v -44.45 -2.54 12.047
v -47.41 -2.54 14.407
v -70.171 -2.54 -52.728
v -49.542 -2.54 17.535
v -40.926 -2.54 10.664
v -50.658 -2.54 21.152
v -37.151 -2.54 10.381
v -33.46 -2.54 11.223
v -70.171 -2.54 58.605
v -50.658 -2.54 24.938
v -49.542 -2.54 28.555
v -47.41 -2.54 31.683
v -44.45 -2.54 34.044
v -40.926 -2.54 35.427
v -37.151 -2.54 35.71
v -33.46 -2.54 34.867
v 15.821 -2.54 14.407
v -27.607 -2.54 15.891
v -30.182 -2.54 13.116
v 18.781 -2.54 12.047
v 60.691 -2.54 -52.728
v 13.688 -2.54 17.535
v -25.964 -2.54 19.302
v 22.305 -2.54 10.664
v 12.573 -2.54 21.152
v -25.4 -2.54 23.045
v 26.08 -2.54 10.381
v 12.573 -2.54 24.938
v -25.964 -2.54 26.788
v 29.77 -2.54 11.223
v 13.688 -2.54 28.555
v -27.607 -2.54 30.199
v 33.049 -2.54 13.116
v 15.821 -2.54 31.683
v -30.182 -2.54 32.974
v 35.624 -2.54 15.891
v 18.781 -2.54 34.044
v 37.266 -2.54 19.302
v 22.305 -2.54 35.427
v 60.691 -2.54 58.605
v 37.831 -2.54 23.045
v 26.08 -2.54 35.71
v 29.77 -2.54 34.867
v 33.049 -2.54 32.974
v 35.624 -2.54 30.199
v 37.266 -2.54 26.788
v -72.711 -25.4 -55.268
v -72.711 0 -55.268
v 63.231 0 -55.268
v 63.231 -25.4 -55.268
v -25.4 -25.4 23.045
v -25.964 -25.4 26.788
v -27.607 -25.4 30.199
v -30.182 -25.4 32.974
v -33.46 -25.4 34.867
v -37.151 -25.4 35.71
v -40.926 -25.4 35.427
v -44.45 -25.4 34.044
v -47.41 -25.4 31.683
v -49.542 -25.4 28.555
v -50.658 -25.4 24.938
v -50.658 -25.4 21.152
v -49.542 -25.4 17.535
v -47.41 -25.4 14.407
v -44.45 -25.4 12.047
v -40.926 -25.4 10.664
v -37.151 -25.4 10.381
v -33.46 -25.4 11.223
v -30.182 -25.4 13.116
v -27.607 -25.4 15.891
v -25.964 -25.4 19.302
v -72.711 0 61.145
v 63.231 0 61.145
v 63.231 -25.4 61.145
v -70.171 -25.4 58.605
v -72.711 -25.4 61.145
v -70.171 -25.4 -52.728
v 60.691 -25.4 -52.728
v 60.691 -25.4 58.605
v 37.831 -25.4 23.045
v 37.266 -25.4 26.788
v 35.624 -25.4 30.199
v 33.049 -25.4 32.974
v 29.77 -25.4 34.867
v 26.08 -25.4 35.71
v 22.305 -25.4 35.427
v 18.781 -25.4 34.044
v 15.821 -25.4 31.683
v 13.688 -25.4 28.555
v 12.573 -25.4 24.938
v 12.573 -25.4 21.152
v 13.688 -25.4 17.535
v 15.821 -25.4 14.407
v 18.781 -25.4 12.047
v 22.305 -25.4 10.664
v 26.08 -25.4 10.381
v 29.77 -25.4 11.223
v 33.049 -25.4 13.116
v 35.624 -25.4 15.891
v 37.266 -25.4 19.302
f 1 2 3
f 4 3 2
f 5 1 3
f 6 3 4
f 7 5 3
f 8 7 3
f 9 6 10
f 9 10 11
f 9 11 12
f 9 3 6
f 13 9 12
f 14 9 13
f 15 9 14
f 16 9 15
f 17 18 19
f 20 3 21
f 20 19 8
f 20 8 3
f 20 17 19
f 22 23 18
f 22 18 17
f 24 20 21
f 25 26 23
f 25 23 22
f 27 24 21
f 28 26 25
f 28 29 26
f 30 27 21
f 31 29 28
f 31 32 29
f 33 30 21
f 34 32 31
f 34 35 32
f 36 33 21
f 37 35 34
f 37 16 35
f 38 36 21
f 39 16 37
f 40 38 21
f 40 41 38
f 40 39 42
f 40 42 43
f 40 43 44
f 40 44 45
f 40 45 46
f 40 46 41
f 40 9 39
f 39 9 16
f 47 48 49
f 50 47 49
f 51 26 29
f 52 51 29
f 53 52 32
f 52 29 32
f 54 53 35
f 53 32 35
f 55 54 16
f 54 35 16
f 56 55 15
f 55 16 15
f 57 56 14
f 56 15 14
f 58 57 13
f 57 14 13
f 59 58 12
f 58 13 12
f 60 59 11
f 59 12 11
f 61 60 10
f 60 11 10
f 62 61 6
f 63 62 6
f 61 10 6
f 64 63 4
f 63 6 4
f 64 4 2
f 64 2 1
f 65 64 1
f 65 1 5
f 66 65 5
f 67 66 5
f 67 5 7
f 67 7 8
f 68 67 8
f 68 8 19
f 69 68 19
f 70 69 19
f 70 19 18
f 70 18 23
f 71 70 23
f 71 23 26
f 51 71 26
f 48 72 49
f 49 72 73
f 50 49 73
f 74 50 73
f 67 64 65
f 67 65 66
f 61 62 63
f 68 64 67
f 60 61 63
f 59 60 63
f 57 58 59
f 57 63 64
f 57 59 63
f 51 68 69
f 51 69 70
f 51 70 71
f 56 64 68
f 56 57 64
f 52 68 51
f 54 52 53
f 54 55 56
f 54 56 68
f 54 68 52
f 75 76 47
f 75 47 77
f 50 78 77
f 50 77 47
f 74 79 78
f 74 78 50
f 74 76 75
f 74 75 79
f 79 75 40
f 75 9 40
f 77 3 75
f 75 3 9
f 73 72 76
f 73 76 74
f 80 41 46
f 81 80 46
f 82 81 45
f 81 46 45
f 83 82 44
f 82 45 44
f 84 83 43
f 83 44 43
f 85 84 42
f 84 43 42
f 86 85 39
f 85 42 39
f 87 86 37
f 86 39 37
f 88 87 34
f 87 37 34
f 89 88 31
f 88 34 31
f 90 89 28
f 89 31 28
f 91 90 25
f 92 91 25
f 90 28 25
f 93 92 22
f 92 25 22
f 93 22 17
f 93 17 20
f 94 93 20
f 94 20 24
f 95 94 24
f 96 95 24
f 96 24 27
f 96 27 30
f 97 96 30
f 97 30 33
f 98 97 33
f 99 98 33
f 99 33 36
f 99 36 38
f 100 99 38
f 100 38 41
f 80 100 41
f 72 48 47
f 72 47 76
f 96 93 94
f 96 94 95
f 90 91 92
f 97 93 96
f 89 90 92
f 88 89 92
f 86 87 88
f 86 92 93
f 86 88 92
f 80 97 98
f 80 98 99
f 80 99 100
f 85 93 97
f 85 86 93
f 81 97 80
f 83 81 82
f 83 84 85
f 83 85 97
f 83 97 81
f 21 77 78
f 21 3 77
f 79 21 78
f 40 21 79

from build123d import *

# Parameters (mm, degrees)
F0_W     = 135.941163
F0_H     = 116.412658
F1_DEPTH = 25.4
F2_T     = -2.54
F3_R     = 12.7
F4_DEPTH = 25.4
F5_R     = 12.7
F6_DEPTH = 25.4


with BuildPart() as f1:
    # F0 (on Front) → F1 (new body)
    with BuildSketch(Plane.XZ):
        with Locations((-4.739925, 2.938757)):
            Rectangle(F0_W, F0_H)
    extrude(amount=F1_DEPTH)

    # F2
    f2_openings = [f1.faces().sort_by_distance(p)[0] for p in [
        (-4.739925, -25.4, 2.938757),
    ]]
    offset(amount=F2_T, openings=f2_openings)

    # F3 (on Front) → F4 (join)
    with BuildSketch(Plane.XZ):
        with Locations((-38.1, 23.045086)):
            Circle(F3_R)
    extrude(amount=F4_DEPTH)

    # F5 (on Front) → F6 (join)
    with BuildSketch(Plane.XZ):
        with Locations((25.130656, 23.045086)):
            Circle(F5_R)
    extrude(amount=F6_DEPTH)


solid = f1.part
